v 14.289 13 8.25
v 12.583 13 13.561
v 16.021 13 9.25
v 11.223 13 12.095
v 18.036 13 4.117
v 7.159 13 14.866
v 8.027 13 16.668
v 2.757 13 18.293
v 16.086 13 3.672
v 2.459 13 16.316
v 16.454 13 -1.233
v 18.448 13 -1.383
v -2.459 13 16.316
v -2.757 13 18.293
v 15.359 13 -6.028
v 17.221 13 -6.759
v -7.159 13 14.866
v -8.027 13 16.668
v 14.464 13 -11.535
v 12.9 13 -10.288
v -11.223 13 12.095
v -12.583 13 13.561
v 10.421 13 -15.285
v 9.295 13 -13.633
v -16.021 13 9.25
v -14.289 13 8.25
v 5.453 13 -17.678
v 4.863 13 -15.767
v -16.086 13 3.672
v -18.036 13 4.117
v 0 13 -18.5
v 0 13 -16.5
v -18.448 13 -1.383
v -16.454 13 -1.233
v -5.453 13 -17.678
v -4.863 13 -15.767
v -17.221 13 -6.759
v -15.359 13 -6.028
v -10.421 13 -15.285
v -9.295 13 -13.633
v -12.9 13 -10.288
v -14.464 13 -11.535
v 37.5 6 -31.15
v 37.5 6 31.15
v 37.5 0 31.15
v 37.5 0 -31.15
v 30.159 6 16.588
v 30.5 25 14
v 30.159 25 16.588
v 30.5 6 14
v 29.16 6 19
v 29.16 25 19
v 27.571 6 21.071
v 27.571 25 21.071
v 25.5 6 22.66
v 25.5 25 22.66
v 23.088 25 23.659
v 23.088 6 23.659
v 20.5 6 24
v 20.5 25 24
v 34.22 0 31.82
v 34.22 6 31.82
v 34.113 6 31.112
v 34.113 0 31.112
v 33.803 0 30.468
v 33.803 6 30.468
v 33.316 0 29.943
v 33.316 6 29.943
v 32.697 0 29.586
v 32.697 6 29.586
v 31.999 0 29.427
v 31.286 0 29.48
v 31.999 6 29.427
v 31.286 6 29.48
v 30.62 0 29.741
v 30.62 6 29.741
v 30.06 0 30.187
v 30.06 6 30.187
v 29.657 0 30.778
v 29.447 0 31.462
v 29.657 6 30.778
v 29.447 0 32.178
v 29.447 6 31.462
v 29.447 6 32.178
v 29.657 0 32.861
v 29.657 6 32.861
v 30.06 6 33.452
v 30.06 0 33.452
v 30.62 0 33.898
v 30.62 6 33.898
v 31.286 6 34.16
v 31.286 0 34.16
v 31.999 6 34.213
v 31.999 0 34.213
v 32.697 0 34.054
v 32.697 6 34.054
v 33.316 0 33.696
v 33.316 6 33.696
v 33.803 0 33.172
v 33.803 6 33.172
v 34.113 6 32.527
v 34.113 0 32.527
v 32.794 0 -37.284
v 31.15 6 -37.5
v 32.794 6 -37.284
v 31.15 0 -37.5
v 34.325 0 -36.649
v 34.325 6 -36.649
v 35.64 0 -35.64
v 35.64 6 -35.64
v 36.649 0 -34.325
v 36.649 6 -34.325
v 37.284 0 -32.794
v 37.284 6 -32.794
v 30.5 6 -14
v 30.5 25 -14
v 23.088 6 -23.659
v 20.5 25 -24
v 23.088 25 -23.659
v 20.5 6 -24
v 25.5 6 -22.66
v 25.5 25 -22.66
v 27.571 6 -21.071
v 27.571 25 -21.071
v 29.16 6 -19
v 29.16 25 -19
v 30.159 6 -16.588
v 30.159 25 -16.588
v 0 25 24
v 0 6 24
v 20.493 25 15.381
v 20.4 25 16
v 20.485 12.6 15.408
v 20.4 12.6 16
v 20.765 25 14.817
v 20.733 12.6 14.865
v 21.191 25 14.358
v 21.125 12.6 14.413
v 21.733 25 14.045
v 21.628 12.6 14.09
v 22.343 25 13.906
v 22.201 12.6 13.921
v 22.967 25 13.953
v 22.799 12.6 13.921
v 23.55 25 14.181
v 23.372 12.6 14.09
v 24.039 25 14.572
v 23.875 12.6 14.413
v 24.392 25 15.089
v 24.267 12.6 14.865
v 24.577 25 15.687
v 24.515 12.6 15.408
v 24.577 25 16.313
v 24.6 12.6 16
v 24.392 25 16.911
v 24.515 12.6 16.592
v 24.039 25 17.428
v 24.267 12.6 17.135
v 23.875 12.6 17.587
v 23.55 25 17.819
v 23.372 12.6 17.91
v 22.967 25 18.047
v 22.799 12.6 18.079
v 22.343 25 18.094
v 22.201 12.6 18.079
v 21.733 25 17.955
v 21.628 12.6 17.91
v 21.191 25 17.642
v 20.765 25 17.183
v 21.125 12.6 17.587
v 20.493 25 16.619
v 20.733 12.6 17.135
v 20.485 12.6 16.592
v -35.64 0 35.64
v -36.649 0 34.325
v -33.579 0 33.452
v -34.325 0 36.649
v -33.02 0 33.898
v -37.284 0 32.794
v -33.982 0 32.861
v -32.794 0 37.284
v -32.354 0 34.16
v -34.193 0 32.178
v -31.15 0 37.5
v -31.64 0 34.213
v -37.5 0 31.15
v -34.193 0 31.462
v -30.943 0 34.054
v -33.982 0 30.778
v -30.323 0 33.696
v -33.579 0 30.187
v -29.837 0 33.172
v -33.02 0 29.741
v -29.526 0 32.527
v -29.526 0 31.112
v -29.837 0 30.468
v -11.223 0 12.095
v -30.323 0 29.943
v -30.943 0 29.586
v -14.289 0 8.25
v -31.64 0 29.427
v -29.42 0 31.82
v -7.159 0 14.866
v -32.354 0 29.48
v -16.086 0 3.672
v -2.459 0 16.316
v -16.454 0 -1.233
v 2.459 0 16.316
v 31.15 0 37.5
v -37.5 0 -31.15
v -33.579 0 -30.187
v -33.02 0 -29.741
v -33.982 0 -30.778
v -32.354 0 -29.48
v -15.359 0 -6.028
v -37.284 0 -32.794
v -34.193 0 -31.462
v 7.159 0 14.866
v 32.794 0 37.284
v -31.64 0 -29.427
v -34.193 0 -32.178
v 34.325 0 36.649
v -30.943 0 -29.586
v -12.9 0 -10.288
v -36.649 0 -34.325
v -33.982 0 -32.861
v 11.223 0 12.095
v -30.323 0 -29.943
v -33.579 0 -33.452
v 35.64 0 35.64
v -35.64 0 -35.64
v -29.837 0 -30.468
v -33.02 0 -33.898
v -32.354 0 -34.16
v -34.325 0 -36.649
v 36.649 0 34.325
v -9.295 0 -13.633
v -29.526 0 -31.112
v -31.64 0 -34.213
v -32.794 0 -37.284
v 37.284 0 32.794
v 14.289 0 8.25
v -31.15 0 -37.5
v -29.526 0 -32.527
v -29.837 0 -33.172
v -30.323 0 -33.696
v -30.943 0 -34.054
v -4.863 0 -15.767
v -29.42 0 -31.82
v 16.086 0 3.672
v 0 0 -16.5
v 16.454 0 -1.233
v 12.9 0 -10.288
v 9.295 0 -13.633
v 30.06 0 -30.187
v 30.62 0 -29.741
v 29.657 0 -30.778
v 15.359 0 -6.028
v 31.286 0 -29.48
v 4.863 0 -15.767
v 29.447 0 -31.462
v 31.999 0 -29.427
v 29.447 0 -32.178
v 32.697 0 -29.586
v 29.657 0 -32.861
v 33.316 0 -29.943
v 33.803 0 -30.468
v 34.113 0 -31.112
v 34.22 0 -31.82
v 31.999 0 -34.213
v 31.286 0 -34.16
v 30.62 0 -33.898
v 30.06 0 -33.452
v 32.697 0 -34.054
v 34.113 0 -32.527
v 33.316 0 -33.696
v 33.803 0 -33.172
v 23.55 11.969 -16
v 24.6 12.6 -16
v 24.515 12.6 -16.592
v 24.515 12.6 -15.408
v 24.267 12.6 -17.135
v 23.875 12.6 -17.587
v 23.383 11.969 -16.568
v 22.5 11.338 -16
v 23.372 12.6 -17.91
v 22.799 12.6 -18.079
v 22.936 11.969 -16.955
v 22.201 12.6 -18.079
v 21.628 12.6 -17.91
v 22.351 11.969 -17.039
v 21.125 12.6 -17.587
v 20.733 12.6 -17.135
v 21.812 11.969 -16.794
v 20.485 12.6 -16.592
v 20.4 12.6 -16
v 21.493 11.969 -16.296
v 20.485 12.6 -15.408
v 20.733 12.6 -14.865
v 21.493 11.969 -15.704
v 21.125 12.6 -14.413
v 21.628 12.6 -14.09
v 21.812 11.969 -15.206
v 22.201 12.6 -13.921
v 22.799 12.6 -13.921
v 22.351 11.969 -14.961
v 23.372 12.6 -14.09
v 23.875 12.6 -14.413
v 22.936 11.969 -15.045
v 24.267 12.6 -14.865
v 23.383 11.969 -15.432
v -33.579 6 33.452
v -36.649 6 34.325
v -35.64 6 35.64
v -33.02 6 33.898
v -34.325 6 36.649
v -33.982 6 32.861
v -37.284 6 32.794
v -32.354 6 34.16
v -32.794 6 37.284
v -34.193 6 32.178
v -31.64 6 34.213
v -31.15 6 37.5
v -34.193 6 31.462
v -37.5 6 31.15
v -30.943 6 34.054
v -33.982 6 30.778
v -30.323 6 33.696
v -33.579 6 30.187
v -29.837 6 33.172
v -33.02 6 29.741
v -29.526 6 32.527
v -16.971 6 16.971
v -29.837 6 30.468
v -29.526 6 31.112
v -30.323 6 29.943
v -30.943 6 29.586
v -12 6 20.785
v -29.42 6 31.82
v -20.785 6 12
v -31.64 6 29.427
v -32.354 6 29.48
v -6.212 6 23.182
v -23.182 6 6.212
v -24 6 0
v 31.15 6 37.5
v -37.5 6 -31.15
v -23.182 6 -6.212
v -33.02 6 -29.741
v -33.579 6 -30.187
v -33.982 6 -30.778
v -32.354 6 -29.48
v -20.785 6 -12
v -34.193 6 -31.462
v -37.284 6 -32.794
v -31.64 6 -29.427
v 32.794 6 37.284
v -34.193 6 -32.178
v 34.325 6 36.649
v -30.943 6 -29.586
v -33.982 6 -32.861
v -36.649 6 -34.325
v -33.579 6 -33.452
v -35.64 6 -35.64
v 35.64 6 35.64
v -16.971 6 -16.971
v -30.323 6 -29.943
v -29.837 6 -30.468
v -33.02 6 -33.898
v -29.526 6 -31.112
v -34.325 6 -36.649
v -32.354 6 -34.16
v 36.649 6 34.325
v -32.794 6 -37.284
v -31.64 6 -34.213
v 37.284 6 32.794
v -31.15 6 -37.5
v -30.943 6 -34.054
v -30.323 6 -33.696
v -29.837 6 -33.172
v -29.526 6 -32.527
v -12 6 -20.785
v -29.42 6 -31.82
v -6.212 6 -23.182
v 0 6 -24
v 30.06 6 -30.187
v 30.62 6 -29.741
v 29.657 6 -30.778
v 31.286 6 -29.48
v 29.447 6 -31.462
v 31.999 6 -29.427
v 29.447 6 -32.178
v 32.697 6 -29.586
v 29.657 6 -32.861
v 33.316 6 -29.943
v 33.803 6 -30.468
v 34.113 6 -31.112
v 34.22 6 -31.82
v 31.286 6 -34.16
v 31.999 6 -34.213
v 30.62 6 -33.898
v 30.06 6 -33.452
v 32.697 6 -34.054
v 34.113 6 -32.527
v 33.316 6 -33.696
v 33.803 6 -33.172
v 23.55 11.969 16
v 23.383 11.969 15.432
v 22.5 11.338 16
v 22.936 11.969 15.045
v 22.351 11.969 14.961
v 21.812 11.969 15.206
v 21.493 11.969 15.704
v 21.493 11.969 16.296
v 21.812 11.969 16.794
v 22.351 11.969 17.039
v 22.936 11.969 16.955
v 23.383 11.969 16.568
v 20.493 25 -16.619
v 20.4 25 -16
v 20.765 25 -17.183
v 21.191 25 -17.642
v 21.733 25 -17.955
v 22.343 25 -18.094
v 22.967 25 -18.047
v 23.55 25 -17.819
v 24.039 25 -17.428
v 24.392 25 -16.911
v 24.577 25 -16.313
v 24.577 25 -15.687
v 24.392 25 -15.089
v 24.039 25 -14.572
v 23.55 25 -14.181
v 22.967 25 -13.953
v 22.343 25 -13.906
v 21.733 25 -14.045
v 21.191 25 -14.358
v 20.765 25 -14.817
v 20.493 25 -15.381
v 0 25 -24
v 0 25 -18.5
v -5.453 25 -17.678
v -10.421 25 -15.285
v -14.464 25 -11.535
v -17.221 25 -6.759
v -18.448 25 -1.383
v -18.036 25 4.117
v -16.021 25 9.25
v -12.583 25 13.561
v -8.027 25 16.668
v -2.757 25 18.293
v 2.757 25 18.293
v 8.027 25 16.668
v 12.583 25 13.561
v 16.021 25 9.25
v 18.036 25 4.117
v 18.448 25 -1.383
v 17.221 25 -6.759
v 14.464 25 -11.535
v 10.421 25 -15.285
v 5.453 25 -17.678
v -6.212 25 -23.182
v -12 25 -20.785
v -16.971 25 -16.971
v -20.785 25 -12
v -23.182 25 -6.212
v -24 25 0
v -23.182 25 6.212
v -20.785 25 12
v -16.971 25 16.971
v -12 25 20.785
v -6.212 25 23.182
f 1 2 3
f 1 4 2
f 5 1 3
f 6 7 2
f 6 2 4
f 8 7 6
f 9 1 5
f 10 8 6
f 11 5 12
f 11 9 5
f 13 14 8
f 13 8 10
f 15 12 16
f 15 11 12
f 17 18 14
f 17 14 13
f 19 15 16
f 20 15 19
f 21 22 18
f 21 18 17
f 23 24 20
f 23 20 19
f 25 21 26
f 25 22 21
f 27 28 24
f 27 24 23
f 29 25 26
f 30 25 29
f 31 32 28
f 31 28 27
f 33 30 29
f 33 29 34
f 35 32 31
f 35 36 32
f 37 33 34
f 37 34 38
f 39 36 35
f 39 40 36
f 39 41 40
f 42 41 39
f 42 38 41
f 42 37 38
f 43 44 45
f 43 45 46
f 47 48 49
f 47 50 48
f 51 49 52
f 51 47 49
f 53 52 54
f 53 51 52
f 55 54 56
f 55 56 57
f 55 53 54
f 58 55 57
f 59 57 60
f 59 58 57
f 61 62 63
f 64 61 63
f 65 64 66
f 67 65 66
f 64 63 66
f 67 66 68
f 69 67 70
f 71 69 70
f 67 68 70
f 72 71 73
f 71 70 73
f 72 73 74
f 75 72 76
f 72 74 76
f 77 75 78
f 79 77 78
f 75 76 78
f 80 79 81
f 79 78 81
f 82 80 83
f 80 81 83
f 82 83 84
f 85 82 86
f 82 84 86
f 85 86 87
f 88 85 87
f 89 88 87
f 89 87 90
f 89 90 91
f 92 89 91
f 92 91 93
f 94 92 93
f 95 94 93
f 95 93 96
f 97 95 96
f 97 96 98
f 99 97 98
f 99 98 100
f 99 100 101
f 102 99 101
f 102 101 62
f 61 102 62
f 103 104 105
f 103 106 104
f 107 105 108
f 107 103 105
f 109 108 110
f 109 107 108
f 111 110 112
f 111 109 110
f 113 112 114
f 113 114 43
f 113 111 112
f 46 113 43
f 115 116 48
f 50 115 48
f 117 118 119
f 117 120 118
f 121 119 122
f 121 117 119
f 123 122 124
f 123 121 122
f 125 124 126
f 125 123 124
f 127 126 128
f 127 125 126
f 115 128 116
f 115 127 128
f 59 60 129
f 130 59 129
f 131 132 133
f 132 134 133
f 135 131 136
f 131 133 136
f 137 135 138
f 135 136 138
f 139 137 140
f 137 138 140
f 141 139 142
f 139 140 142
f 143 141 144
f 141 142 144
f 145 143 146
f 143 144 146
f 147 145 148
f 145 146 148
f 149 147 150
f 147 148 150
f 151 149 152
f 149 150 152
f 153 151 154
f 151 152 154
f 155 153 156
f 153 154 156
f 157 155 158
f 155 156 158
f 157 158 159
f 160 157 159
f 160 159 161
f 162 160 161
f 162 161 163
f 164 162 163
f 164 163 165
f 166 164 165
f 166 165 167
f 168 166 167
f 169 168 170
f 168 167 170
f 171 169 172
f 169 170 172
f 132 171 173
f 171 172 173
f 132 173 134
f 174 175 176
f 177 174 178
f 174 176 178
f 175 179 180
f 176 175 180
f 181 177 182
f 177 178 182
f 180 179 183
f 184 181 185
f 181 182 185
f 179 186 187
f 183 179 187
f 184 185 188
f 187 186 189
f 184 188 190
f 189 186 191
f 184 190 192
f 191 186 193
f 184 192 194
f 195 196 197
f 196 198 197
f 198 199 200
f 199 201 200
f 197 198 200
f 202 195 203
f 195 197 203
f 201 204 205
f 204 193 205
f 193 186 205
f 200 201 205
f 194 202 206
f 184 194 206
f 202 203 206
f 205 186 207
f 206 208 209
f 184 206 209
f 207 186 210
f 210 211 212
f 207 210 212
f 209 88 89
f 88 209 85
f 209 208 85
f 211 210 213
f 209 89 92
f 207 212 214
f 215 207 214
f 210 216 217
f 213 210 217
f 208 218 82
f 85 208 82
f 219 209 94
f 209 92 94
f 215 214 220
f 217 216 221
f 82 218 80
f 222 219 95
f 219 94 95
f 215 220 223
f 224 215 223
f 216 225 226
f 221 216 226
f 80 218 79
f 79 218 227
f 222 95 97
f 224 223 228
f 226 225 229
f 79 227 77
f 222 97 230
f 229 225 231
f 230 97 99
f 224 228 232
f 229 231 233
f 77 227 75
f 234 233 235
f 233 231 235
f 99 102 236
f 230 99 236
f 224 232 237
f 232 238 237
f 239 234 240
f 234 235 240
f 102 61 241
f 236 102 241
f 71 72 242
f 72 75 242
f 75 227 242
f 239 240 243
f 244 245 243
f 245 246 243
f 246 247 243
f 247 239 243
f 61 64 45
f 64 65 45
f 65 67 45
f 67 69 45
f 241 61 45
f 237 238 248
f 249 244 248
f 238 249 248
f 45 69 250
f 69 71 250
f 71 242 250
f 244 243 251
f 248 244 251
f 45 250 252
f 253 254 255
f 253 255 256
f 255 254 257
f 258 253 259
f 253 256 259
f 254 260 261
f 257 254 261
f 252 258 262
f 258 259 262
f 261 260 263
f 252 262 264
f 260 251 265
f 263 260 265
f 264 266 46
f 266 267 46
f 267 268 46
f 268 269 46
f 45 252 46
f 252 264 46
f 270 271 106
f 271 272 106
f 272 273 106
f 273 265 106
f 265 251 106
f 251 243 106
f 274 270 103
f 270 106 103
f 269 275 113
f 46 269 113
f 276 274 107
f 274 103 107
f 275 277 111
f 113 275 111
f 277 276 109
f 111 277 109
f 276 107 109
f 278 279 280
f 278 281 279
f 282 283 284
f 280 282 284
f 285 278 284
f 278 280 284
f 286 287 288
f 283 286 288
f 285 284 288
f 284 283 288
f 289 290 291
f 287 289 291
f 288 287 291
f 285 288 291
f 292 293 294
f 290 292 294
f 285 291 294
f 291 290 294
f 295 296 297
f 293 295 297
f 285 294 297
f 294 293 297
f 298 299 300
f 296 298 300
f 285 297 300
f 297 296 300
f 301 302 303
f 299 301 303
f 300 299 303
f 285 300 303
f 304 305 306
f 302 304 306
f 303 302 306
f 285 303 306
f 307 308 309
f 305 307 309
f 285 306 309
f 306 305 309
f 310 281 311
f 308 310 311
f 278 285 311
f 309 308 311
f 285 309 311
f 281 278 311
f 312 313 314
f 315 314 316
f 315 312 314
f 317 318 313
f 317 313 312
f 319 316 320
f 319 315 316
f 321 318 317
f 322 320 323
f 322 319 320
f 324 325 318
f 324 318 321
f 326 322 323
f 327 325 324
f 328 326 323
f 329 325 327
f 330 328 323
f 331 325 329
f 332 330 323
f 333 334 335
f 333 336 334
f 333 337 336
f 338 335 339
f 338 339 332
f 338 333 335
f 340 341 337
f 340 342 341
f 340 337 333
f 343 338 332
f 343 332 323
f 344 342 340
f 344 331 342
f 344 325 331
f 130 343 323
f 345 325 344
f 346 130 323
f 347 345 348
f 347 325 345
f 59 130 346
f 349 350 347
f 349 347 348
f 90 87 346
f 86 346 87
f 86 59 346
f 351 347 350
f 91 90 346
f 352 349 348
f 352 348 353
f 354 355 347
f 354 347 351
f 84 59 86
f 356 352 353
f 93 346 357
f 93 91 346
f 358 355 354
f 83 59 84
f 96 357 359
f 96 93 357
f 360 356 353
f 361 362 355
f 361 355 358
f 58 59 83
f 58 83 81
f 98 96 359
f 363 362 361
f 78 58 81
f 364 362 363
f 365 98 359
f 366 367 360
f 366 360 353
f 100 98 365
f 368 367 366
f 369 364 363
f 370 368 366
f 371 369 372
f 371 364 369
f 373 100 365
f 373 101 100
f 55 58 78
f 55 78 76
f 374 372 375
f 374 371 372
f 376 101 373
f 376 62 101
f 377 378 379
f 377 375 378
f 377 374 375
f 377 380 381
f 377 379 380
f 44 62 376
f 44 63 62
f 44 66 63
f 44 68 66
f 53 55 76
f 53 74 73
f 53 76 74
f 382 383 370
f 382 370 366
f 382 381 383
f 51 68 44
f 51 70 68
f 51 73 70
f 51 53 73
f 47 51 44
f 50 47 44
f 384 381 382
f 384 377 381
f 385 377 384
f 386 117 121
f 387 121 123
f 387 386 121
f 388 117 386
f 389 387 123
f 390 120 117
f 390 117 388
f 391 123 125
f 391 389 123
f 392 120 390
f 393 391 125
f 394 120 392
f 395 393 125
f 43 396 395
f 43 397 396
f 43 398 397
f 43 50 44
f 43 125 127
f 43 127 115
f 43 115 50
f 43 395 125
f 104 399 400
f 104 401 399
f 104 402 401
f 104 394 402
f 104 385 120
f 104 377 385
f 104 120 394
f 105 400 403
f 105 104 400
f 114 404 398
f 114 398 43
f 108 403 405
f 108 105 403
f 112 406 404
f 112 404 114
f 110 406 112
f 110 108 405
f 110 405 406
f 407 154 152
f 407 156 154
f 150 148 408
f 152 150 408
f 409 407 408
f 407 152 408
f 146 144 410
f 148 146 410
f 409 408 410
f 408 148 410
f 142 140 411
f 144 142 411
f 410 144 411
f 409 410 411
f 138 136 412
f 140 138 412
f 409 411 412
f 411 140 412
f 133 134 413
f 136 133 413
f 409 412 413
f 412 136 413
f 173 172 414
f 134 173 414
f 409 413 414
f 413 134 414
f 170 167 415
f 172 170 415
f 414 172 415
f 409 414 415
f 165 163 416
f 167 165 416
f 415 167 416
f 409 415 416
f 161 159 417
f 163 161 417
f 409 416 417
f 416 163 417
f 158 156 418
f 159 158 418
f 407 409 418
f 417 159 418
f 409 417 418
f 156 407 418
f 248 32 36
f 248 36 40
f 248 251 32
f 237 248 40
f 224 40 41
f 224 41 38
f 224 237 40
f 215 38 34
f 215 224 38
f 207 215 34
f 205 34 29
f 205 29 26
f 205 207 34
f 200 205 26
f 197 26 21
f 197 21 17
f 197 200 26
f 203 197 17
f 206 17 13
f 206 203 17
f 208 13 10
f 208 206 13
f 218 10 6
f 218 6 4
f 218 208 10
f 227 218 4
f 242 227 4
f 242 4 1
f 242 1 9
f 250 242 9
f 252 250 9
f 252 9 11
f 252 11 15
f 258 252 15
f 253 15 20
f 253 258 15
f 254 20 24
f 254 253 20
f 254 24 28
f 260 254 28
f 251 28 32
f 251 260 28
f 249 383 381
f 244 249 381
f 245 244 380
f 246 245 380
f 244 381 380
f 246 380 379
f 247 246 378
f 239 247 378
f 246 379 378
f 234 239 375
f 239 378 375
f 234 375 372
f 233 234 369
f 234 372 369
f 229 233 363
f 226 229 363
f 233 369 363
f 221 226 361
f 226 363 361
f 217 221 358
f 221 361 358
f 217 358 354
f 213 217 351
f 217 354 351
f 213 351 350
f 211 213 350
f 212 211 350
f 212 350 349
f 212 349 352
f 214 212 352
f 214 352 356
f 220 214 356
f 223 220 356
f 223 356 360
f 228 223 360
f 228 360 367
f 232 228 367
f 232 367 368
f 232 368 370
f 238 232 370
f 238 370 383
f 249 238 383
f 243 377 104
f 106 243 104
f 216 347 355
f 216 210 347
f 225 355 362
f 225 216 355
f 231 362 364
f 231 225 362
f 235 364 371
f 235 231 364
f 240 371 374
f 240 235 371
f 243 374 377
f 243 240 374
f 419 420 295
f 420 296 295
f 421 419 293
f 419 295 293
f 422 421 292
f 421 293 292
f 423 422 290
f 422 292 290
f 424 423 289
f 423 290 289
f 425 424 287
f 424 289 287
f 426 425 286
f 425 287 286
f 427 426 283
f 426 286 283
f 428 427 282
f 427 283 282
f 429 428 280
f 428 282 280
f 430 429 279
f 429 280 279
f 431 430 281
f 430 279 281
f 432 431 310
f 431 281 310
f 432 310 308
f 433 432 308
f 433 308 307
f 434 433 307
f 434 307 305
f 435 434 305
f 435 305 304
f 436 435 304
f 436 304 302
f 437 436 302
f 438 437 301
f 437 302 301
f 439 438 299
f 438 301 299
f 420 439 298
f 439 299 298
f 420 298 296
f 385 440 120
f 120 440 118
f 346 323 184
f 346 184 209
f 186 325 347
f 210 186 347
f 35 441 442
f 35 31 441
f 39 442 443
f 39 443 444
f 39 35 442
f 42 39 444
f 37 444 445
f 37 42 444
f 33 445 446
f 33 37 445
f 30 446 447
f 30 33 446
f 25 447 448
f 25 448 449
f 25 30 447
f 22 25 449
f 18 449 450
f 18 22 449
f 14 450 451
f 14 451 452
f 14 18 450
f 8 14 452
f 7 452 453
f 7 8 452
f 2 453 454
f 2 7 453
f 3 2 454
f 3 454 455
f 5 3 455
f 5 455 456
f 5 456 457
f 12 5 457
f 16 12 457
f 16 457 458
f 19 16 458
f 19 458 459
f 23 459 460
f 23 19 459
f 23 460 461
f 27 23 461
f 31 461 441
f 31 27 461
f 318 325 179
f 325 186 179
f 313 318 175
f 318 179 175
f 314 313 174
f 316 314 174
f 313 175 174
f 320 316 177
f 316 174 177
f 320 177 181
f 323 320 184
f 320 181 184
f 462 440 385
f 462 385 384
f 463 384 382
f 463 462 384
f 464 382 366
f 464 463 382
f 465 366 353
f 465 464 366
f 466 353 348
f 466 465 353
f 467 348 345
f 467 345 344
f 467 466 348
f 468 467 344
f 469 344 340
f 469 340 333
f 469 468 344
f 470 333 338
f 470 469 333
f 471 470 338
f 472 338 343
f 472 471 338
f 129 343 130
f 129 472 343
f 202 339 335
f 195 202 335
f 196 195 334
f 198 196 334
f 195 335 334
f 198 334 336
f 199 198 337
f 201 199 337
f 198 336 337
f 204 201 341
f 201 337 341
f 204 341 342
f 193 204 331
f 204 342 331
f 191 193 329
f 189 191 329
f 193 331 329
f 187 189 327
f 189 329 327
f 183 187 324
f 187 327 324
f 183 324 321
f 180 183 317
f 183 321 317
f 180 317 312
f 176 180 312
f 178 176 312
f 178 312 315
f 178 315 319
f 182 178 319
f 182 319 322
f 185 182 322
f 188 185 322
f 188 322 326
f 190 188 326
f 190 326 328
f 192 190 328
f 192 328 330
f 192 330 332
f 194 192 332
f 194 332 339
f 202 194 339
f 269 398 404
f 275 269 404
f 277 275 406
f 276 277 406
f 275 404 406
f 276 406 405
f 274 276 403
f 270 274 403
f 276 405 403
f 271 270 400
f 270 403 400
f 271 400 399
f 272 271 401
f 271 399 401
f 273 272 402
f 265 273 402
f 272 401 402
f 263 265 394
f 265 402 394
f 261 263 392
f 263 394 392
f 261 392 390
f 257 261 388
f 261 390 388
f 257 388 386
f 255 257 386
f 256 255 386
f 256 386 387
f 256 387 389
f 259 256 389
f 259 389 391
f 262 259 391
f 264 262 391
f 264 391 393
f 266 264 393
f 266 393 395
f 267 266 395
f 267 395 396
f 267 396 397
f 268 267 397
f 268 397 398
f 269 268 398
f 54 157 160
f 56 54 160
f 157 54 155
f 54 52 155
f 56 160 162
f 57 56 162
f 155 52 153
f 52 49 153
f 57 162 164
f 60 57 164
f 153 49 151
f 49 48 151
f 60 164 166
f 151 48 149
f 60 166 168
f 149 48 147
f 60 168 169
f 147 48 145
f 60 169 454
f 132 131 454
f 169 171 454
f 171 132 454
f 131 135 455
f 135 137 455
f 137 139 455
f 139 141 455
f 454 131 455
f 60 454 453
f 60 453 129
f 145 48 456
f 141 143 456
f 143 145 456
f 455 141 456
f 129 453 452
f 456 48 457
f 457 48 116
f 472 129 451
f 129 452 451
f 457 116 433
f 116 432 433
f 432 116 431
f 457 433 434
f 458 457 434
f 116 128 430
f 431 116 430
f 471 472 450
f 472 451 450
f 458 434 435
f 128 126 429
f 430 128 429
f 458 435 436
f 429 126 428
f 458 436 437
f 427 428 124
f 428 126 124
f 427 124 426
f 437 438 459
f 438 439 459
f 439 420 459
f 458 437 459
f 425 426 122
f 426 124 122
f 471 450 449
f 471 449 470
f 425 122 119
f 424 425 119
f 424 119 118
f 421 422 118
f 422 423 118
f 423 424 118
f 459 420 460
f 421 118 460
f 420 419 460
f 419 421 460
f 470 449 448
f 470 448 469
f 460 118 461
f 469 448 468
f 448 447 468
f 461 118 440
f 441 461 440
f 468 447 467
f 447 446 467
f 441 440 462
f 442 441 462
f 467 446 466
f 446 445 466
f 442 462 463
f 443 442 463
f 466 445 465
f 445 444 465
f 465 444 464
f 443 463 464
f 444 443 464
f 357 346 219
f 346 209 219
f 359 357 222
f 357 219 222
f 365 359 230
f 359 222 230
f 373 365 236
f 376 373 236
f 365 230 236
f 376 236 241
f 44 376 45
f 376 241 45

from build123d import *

# Parameters (mm, degrees)
SKETCH2_W                = 75
SKETCH2_H                = 75
SKETCH2_R                = 21
BOSS_EXTRUDE1_DEPTH      = 6
M4_CLEARANCE_HOLE1_D     = 4.8
M4_CLEARANCE_HOLE1_DEPTH = 25
FILLET1_R                = 6.35
SKETCH5_R                = 22.809118079
BOSS_EXTRUDE2_DEPTH      = 19
FILLET2_R                = 10
M5_TAPPED_HOLE1_D        = 4.2
M5_TAPPED_HOLE1_DEPTH    = 12.4
M5_TAPPED_HOLE1_TIP      = 1.2618073


with BuildPart() as part:
    # Sketch1 → Revolve1 (revolve)
    with BuildSketch(Plane.XY, mode=Mode.PRIVATE) as revolve1_sk:
        Polygon((-16.5, 0), (-34, 0), (-34, 6), (-24, 6), (-24, 25), (-18.5, 25), (-18.5, 13), (-16.5, 13), align=None)
    revolve(revolve1_sk.sketch.rotate(Axis((0, 0, 0), (0, 1, 0)), 270), axis=Axis((0, 0, 0), (0, 1, 0)))

    # Sketch2 → Boss-Extrude1 (add)
    with BuildSketch(Plane(origin=(0, 6, 0), x_dir=(1, 0, 0), z_dir=(0, 1, 0))):
        Rectangle(SKETCH2_W, SKETCH2_H)
        Circle(SKETCH2_R, mode=Mode.SUBTRACT)
    extrude(amount=-BOSS_EXTRUDE1_DEPTH)

    # M4 Clearance Hole1
    with Locations(Plane(origin=(0, 0, 0), x_dir=(-1, 0, 0), z_dir=(0, -1, 0))):
        with Locations((0, 0), (-31.819805153, 31.819805153), (31.819805153, 31.819805153), (31.819805153, -31.819805153), (-31.819805153, -31.819805153)):
            Hole(M4_CLEARANCE_HOLE1_D / 2, depth=M4_CLEARANCE_HOLE1_DEPTH)

    # Fillet1
    fillet1_edges = [part.edges().sort_by_distance(p)[0] for p in [
        (37.5, 3, 37.5),
        (37.5, 3, -37.5),
        (-37.5, 3, -37.5),
        (-37.5, 3, 37.5),
    ]]
    fillet(fillet1_edges, radius=FILLET1_R)

    # Sketch5 → Boss-Extrude2 (add)
    with BuildSketch(Plane(origin=(0, 25, 0), x_dir=(1, 0, 0), z_dir=(0, 1, 0))):
        with BuildLine():
            Line((0, 24), (6.5, 24))
            Line((6.5, 24), (30.5, 24))
            Line((30.5, 24), (30.5, -24))
            Line((30.5, -24), (6.5, -24))
            Line((6.5, -24), (0, -24))
            ThreePointArc((0, -24), (-24, 0), (0, 24))
        make_face()
        Circle(SKETCH5_R, mode=Mode.SUBTRACT)
    extrude(amount=-BOSS_EXTRUDE2_DEPTH)

    # Fillet2
    fillet2_edges = [part.edges().sort_by_distance(p)[0] for p in [
        (30.5, 15.5, -24),
        (30.5, 15.5, 24),
    ]]
    fillet(fillet2_edges, radius=FILLET2_R)

    # M5 Tapped Hole1
    with Locations(Plane(origin=(0, 25, 0), x_dir=(1, 0, 0), z_dir=(0, 1, 0))):
        with Locations((22.5, 16), (22.5, -16)):
            Hole(M5_TAPPED_HOLE1_D / 2, depth=M5_TAPPED_HOLE1_DEPTH)
            with Locations((0, 0, -(M5_TAPPED_HOLE1_DEPTH + M5_TAPPED_HOLE1_TIP / 2))):  # 118° drill point
                Cone(0, M5_TAPPED_HOLE1_D / 2, M5_TAPPED_HOLE1_TIP, mode=Mode.SUBTRACT)


solid = part.part
